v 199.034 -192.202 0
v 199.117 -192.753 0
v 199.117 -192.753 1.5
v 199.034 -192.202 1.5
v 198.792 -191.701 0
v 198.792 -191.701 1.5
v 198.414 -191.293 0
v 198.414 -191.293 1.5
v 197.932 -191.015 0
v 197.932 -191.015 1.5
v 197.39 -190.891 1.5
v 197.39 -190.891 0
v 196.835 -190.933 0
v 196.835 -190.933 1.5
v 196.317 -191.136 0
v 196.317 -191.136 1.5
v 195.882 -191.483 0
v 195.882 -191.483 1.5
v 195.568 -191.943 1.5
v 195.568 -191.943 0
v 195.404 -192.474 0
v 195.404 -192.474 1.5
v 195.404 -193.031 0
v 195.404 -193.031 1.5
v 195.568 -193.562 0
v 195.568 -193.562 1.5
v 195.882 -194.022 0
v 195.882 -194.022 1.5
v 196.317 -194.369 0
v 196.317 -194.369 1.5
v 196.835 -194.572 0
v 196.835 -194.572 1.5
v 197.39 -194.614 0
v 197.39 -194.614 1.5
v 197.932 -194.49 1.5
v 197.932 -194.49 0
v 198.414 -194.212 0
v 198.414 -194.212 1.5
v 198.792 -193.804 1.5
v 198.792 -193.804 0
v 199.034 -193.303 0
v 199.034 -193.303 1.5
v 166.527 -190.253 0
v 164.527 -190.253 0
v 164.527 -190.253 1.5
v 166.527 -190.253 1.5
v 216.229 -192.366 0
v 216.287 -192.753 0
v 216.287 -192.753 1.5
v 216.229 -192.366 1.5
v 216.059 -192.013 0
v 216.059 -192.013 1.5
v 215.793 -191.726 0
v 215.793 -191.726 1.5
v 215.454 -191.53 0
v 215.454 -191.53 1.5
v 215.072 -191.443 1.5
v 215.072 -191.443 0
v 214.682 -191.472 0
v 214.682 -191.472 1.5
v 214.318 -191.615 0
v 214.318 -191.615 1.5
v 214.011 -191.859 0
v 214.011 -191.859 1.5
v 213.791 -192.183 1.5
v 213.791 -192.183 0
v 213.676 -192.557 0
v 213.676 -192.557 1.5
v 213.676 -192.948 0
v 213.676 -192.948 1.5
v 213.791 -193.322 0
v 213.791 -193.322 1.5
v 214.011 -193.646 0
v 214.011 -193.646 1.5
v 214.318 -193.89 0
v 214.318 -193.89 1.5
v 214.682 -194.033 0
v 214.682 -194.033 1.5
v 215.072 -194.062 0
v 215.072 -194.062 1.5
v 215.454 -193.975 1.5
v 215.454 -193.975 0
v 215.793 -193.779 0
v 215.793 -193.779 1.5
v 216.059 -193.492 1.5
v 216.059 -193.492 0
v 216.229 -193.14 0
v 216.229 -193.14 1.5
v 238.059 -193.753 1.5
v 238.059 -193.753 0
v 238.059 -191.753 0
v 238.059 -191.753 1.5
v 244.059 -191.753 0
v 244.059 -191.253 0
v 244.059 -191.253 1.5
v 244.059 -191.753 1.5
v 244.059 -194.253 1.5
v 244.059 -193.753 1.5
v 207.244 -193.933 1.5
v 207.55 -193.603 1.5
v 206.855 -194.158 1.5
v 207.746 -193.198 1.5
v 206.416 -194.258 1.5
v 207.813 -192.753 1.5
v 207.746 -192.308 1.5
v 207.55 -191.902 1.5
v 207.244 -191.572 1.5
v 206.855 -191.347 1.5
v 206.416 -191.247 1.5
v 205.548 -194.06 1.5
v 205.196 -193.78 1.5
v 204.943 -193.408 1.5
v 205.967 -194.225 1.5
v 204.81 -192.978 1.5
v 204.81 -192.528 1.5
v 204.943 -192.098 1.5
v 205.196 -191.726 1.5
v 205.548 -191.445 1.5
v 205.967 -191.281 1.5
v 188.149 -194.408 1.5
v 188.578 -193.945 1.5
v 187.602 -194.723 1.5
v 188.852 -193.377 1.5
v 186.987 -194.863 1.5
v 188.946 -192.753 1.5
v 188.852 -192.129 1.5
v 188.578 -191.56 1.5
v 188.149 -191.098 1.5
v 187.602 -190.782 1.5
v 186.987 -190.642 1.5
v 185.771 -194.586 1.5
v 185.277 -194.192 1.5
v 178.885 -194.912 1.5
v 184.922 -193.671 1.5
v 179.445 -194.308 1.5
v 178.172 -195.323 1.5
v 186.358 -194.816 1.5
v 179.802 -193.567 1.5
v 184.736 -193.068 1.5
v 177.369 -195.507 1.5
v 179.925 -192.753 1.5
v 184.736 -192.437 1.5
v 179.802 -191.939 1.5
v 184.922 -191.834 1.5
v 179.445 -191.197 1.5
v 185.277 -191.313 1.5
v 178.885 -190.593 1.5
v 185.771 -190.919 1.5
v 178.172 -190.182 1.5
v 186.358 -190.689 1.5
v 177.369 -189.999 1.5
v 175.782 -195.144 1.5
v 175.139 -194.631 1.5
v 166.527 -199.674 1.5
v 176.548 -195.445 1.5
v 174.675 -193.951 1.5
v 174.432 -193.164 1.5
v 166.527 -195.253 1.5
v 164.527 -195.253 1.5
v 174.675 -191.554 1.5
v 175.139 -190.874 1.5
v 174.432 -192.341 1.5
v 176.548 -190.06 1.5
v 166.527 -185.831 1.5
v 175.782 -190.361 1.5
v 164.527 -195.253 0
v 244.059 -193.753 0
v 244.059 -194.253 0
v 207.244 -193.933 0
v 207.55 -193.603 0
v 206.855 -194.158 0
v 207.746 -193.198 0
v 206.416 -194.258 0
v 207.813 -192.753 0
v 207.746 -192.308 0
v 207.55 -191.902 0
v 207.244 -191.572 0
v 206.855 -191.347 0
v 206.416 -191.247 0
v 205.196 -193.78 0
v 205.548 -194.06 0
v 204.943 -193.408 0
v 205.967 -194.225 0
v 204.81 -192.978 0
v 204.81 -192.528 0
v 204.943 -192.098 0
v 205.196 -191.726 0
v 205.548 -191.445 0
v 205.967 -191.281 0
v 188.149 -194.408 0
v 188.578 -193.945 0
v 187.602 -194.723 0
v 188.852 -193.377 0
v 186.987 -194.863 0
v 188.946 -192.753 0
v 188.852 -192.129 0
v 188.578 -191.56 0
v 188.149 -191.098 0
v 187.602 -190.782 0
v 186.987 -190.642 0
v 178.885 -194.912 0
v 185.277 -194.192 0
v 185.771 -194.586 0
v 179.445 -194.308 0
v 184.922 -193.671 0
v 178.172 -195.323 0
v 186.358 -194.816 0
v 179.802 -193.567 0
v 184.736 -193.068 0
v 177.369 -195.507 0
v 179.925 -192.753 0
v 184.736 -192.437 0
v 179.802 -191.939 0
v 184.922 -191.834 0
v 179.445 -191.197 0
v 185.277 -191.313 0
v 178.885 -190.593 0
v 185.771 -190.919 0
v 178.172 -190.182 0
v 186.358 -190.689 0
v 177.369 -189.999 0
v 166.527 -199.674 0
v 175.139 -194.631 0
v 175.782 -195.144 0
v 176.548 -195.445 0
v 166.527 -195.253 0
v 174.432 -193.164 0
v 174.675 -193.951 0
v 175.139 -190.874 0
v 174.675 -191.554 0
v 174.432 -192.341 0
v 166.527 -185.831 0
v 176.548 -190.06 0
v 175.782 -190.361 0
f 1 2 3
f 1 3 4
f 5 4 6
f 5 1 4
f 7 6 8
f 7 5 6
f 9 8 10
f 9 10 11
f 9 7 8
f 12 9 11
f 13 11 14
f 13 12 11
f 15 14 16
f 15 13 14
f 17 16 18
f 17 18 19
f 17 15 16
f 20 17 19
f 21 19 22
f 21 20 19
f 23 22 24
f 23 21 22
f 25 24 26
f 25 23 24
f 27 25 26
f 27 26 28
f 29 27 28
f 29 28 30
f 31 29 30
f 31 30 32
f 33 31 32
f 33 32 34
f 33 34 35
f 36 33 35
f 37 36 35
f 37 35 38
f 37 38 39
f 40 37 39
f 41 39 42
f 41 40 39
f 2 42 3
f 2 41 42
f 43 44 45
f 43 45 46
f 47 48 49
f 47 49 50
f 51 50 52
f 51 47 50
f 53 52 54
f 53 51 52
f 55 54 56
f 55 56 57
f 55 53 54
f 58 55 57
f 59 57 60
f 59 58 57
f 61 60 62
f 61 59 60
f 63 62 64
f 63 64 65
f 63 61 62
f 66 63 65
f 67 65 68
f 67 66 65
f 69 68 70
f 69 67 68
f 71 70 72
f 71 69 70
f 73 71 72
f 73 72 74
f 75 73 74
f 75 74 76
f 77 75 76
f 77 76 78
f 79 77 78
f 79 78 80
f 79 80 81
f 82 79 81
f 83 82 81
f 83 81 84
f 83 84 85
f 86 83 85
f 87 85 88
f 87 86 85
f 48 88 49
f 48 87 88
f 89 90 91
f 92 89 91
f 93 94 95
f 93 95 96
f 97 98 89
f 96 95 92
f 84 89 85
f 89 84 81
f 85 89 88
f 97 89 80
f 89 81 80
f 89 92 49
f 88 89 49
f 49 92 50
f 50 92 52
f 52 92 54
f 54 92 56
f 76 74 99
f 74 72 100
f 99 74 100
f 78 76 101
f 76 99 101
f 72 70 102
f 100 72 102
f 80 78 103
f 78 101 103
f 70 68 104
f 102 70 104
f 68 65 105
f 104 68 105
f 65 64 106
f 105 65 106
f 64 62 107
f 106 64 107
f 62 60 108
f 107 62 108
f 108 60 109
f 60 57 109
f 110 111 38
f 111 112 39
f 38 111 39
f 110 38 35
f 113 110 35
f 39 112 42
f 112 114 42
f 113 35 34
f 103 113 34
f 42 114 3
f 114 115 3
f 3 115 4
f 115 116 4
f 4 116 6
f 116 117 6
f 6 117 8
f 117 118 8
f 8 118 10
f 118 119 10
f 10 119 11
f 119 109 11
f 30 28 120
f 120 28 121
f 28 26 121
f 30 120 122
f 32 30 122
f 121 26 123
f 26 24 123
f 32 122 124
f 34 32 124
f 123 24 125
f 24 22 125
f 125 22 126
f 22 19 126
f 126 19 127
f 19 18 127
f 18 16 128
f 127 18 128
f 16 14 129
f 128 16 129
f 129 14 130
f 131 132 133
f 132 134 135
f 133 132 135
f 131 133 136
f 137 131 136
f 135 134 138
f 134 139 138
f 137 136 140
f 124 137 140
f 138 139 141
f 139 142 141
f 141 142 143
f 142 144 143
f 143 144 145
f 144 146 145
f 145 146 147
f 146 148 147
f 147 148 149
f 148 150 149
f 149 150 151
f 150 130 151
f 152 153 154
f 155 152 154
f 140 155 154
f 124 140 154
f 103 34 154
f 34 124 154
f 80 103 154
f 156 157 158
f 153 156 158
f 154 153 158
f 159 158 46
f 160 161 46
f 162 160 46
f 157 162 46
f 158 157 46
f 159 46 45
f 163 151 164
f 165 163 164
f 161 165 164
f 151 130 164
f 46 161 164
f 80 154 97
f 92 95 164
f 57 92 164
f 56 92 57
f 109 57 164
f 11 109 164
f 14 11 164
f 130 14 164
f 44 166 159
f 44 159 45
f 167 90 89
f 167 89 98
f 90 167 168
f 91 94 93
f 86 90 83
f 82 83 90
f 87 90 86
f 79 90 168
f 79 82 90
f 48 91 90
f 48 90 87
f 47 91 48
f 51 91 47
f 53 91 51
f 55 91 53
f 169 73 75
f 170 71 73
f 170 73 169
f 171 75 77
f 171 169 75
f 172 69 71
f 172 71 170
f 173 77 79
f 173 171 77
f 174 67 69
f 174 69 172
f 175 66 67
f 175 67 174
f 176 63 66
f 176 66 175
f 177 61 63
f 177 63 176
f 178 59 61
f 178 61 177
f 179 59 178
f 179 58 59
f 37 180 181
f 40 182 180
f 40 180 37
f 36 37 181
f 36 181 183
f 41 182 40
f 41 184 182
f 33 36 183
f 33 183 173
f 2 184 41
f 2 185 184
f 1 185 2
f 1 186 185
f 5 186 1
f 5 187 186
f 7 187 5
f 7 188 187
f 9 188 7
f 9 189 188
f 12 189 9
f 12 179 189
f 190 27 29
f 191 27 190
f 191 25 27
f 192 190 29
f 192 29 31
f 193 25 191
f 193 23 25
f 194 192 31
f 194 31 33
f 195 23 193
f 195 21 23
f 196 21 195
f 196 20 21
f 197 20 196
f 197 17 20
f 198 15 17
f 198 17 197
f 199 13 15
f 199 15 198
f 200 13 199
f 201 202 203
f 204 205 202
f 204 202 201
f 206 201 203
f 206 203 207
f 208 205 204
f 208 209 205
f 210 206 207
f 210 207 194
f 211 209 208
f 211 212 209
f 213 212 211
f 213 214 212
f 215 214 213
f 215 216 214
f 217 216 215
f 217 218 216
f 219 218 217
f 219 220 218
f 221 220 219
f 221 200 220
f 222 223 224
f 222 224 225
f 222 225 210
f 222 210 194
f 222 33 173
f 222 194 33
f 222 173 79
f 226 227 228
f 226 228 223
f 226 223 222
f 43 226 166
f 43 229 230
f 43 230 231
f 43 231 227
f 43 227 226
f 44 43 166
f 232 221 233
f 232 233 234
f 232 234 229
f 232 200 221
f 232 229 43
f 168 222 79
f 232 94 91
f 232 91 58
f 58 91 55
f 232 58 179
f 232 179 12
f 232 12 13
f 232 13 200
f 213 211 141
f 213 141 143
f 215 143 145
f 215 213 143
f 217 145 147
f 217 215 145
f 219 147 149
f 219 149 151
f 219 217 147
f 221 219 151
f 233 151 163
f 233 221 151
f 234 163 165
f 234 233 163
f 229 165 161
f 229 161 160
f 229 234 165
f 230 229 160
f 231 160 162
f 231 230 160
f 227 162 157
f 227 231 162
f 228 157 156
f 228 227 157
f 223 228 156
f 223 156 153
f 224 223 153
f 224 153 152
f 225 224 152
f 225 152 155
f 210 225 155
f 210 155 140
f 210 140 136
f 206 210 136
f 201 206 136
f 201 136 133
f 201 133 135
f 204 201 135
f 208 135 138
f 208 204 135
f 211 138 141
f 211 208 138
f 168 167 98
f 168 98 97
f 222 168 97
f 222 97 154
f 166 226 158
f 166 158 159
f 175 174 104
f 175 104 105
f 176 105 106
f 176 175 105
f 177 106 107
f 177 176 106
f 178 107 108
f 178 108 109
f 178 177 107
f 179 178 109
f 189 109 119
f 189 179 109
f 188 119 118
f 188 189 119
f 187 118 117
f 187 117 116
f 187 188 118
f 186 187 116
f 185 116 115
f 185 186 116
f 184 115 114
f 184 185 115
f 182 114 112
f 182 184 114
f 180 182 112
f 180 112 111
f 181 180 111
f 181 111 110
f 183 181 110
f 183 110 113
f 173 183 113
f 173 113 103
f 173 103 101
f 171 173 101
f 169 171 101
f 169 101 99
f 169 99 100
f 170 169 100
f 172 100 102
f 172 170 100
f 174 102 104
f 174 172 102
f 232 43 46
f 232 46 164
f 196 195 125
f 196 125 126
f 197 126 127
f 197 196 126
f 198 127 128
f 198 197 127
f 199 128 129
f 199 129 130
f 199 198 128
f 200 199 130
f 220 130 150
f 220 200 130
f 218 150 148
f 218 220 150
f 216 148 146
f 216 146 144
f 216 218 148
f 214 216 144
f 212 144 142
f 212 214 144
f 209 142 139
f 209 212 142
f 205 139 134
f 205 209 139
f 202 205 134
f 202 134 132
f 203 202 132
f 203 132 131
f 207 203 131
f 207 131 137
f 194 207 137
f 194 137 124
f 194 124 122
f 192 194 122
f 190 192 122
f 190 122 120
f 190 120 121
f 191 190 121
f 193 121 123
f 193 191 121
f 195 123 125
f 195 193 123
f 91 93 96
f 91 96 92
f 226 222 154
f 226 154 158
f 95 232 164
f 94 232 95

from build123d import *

# Parameters (mm, degrees)
MODEL_R         = 2.761626555
MODEL_R_2       = 1.866571664
MODEL_R_3       = 1.313234148
MODEL_R_4       = 2.116722719
MODEL_R_5       = 1.509742993
EXTRUDE_1_DEPTH = 1.5


with BuildPart() as part:
    # Model → 凸台-拉伸1 (new body)
    with BuildSketch(Plane.XY):
        Polygon((244.059423642, -194.252615776), (166.526919178, -199.674216635), (166.526919178, -195.252615776), (164.526919178, -195.252615776), (164.526919178, -190.252615776), (166.526919178, -190.252615776), (166.526919178, -185.831017216), (244.059416516, -191.252615776), (244.059417704, -191.752615776), (238.059420079, -191.752615776), (238.059420079, -192.752615776), (238.059420079, -193.752615776), (244.059422454, -193.752615776), align=None)
        with Locations((177.162967315, -192.752615776)):
            Circle(MODEL_R, mode=Mode.SUBTRACT)
        with Locations((197.250125118, -192.752615776)):
            Circle(MODEL_R_2, mode=Mode.SUBTRACT)
        with Locations((214.974129703, -192.752615776)):
            Circle(MODEL_R_3, mode=Mode.SUBTRACT)
        with Locations((186.829055112, -192.752615776)):
            Circle(MODEL_R_4, mode=Mode.SUBTRACT)
        with Locations((206.302954902, -192.752615776)):
            Circle(MODEL_R_5, mode=Mode.SUBTRACT)
    extrude(amount=EXTRUDE_1_DEPTH)


solid = part.part
